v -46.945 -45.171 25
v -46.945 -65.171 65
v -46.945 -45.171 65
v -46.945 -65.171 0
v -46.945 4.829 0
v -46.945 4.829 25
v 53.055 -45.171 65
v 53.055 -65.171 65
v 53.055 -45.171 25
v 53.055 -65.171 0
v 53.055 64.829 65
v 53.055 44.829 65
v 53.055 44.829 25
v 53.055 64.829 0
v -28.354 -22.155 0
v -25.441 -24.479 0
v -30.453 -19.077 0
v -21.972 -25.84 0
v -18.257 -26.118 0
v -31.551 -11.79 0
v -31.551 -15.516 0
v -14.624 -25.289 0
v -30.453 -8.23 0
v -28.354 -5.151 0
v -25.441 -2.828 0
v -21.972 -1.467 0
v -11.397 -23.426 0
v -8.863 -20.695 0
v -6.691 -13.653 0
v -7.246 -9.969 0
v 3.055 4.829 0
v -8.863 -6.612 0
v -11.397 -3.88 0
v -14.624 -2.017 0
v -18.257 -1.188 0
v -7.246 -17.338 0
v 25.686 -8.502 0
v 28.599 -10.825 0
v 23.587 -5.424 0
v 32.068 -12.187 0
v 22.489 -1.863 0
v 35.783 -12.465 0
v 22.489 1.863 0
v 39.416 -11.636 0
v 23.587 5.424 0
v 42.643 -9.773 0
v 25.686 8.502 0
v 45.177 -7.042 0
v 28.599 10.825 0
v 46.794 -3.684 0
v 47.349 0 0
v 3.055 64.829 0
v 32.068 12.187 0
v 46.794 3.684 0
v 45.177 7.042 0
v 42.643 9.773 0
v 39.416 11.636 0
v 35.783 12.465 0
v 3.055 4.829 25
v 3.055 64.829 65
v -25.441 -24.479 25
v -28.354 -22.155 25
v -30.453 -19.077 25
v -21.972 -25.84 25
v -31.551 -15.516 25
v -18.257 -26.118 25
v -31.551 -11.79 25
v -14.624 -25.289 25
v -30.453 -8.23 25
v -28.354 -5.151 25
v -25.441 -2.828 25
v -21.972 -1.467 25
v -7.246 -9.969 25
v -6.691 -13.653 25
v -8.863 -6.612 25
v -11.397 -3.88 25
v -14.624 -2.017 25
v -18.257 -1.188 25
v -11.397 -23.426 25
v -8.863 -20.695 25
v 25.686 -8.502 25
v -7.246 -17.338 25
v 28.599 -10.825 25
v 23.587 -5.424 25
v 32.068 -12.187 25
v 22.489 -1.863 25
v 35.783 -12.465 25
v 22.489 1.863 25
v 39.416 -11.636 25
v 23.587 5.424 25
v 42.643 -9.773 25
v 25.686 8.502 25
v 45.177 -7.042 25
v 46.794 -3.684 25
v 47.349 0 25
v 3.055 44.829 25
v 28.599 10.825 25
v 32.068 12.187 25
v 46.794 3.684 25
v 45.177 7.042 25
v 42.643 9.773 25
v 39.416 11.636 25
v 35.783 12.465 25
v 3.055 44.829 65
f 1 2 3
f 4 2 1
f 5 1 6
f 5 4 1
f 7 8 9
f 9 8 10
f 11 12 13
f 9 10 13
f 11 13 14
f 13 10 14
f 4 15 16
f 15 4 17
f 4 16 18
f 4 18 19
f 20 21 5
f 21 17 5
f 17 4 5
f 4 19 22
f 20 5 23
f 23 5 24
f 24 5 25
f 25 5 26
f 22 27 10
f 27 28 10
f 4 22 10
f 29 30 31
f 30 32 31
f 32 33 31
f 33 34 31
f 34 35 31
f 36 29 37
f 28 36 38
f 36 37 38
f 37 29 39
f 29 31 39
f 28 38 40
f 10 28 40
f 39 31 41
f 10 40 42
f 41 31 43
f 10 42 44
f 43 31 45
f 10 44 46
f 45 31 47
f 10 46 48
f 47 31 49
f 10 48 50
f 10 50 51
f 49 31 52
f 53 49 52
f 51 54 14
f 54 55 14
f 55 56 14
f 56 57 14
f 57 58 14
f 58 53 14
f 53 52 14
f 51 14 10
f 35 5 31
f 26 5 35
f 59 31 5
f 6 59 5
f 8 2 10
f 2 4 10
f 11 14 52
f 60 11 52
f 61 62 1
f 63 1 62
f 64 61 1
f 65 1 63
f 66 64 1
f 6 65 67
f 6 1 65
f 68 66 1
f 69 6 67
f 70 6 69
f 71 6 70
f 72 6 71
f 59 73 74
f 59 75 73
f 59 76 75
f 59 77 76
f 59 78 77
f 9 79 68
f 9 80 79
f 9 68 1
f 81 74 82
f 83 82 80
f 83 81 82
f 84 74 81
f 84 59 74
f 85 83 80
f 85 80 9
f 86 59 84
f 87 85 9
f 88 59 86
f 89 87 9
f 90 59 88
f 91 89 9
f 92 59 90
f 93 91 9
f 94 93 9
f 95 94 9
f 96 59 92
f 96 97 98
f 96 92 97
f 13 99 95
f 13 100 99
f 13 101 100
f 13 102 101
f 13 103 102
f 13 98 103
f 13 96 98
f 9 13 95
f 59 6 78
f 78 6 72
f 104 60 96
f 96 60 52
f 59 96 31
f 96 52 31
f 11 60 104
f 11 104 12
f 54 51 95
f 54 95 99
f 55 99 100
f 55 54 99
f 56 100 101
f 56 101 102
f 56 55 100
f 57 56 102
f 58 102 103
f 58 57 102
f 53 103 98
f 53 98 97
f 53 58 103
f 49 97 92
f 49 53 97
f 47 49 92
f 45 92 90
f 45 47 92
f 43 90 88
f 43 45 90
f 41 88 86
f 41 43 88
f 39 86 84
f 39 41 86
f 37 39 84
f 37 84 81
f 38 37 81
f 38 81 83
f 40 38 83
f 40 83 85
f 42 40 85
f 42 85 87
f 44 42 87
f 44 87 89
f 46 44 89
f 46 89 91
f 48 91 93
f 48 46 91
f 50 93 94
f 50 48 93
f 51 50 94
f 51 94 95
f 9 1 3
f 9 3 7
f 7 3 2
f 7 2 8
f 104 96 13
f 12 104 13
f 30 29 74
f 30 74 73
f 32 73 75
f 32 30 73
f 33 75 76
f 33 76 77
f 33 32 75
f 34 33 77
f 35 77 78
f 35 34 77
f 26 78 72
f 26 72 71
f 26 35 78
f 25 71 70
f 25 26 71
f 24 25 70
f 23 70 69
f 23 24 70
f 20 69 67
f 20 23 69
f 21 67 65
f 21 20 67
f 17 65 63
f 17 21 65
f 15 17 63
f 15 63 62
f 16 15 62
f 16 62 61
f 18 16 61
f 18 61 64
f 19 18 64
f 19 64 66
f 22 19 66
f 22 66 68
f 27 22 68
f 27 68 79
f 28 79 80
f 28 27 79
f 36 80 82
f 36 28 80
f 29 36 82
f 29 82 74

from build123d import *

# Parameters (mm, degrees)
F0_R     = 12.5
F1_DEPTH = 25
F2_W     = 100
F2_H     = 20
F2_W_2   = 50
F3_DEPTH = 40


with BuildPart() as f1:
    # F0 (on Top) → F1 (new body)
    with BuildSketch(Plane.XY):
        Polygon((-46.945058, -65.1706), (53.054942, -65.1706), (53.054942, 4.8294), (53.054942, 64.8294), (3.054942, 64.8294), (3.054942, 4.8294), (-46.945058, 4.8294), align=None)
        with Locations((-19.190943, -13.653258)):
            Circle(F0_R, mode=Mode.SUBTRACT)
        with Locations((34.849223, 0)):
            Circle(F0_R, mode=Mode.SUBTRACT)
    extrude(amount=F1_DEPTH)

    # F2 (on face) → F3 (join)
    with BuildSketch(Plane.XY.offset(25)):
        with Locations((3.054942, -55.1706)):
            Rectangle(F2_W, F2_H)
        with Locations((28.054942, 54.8294)):
            Rectangle(F2_W_2, F2_H)
    extrude(amount=F3_DEPTH)


solid = f1.part
